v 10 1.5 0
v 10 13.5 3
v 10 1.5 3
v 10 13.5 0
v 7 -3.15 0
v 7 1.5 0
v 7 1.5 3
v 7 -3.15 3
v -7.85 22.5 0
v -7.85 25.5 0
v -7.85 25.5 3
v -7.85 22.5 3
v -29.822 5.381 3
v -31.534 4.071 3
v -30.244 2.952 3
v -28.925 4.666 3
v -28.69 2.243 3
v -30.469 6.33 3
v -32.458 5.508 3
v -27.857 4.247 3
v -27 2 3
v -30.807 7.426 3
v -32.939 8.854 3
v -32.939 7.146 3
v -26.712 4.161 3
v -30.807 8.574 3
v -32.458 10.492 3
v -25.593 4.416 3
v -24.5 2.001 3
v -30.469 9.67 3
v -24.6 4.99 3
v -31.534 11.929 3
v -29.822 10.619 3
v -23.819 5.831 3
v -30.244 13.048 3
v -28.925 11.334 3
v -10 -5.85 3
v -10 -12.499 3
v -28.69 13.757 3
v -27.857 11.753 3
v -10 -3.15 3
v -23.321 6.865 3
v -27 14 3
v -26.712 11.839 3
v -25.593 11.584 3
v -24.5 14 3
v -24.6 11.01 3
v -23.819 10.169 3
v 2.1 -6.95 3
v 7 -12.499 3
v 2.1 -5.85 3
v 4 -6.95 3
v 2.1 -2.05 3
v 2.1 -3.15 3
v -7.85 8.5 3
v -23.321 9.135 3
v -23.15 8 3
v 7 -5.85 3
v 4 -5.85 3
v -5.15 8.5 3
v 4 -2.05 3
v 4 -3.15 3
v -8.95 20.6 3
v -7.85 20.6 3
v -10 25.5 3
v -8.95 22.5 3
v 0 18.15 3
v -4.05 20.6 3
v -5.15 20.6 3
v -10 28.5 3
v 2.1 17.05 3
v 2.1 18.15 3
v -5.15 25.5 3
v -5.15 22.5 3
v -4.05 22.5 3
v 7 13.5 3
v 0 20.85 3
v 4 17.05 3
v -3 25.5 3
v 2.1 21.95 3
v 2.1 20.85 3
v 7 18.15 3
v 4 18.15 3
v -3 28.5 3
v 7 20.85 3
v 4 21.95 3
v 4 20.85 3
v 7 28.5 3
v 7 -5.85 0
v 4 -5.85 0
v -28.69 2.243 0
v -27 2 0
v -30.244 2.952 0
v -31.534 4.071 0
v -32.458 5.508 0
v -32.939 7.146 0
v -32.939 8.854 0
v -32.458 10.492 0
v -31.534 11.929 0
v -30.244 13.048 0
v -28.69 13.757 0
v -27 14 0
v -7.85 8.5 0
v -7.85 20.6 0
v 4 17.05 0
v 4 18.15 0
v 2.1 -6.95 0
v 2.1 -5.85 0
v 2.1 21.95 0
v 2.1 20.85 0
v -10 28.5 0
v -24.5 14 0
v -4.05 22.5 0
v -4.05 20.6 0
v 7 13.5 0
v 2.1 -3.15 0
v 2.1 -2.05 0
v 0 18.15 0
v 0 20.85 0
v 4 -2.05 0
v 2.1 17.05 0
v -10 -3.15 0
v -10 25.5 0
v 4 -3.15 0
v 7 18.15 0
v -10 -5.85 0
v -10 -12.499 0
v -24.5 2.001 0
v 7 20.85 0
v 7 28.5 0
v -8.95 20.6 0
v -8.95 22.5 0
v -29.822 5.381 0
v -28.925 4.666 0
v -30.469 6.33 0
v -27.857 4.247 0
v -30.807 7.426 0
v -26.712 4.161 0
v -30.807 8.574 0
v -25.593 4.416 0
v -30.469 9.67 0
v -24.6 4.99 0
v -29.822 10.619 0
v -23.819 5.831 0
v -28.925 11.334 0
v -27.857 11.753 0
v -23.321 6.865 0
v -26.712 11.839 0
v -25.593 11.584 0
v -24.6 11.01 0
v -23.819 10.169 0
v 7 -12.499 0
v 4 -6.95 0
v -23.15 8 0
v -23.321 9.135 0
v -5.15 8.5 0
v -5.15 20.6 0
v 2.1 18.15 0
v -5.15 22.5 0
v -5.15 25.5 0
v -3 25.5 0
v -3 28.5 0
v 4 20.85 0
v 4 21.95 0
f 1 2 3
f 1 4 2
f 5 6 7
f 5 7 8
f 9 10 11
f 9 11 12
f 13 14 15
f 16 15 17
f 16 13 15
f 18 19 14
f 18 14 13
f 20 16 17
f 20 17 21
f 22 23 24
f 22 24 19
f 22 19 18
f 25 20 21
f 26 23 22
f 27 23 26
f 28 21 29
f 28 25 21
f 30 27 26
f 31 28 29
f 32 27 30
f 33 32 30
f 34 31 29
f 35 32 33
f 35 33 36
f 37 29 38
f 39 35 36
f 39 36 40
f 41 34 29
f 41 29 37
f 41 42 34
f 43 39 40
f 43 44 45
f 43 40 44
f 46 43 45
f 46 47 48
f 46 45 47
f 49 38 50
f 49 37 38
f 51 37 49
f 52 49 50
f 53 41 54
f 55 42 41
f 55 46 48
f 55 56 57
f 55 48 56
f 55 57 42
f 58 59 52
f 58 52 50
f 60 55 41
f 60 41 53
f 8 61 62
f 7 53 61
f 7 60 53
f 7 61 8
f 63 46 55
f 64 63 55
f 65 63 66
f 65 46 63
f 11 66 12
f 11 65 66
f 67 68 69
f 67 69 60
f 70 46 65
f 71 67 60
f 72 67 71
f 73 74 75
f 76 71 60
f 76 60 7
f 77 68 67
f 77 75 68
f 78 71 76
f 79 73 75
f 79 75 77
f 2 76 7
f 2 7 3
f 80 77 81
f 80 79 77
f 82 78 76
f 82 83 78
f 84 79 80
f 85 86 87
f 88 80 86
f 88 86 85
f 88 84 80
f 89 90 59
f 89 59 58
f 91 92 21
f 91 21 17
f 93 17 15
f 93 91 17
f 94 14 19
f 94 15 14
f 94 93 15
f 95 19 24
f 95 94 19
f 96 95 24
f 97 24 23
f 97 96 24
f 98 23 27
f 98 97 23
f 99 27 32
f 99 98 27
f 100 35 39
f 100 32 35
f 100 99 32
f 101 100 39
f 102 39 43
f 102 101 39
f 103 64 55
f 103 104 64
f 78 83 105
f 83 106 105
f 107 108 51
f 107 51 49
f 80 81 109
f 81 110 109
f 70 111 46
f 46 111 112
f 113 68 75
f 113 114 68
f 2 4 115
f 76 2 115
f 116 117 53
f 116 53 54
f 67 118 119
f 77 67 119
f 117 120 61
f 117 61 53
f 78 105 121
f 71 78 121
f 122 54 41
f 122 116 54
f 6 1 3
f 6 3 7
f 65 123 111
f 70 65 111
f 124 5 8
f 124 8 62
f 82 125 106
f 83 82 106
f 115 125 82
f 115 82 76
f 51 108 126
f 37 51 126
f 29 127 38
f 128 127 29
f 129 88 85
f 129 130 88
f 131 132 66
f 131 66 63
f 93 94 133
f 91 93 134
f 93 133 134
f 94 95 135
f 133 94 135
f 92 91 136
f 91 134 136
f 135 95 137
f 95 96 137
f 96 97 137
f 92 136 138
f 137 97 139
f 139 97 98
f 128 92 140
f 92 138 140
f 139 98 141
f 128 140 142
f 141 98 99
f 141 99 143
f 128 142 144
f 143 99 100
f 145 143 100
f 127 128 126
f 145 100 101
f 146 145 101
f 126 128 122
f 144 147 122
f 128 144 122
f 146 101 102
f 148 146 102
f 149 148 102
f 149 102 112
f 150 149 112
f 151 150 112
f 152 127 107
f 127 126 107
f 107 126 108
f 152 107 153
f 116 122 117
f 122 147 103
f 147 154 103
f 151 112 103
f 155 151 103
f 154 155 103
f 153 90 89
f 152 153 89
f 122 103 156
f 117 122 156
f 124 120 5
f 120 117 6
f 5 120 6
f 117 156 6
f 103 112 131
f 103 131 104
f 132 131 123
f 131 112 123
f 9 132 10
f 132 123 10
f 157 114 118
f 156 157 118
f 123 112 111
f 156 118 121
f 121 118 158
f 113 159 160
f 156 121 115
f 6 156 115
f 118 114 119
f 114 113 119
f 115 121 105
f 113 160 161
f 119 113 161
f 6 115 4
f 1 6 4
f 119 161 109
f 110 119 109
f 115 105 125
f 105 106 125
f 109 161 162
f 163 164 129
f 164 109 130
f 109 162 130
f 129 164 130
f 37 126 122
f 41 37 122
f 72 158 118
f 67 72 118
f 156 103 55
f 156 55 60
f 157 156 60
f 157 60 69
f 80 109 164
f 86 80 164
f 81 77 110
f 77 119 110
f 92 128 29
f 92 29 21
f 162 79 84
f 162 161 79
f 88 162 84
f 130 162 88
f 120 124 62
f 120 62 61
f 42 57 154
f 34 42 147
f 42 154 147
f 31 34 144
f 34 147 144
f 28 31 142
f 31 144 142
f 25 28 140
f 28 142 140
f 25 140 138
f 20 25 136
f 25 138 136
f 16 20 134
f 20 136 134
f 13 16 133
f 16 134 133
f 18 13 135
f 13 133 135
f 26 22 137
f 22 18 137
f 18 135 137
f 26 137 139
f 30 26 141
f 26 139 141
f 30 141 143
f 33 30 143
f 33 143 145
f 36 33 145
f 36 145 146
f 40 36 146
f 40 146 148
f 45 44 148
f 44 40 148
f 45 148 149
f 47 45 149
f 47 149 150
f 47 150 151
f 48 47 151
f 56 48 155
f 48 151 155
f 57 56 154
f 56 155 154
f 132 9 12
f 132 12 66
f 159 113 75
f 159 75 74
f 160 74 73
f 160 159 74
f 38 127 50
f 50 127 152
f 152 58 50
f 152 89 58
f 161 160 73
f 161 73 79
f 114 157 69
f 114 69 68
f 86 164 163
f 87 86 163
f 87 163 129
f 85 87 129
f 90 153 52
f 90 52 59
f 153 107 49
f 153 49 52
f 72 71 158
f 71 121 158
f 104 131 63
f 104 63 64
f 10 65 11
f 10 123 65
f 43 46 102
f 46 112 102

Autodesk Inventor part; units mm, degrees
ref_plane "YZ Plane" through (0, 0, 0) normal (1, 0, 0) x (0, 1, 0)
ref_plane "XZ Plane" through (0, 0, 0) normal (0, 1, 0) x (-1, 0, 0)
ref_plane "XY Plane" through (0, 0, 0) normal (0, 0, 1) x (1, 0, 0)
sketch "Эскиз1" plane through (0, 0, 0) normal (0, 0, 1) x (1, 0, 0)
  line L0 (10, -28.5) -> (-10, -28.5)
  line L1 (-10, -28.5) -> (-10, 28.5)
  line L2 (-10, 28.5) -> (10, 28.5)
  line L3 (10, 28.5) -> (10, -28.5)
  line L4 (10, -28.5) -> (-10, 28.5) construction
  line L5 (-10, -28.5) -> (10, 28.5) construction
  line L6 (-10, 28.5) -> (-27, 28.5)
  line L7 (-27, 28.5) -> (-27, -28.5)
  line L8 (-27, -28.5) -> (-10, -28.5)
  line L9 (-10, -28.5) -> (-10, 28.5)
  line L10 (-27, -28.5) -> (-27, 28.5)
  line L11 (10, 28.5) -> (-10, 28.5)
  line L12 (-10, 28.5) -> (-10, 25.5)
  line L13 (-10, 25.5) -> (10, 25.5)
  line L14 (10, 25.5) -> (10, 28.5)
  line L15 (10, 25.5) -> (7, 25.5)
  line L16 (7, 25.5) -> (7, -28.5)
  line L17 (7, -28.5) -> (10, -28.5)
  line L18 (10, -28.5) -> (10, 25.5)
  line L19 (7, 25.5) -> (-3, 25.5)
  line L20 (-3, 25.5) -> (-3, 28.5)
  line L21 (-3, 28.5) -> (7, 28.5)
  line L22 (7, 28.5) -> (7, 25.5)
  line L23 (-10, 25.5) -> (-3, 28.5)
  line L24 (-3, 25.5) -> (-10, 28.5)
  line L25 (-6.5, 27) -> (-6.5, 17)
  line L26 (7, 25.5) -> (10, 25.5)
  line L27 (10, 25.5) -> (10, 13.5)
  line L28 (10, 13.5) -> (7, 13.5)
  line L29 (7, 13.5) -> (7, 25.5)
  line L30 (7, 25.5) -> (10, 13.5)
  line L31 (7, 13.5) -> (10, 25.5)
  line L32 (8.5, 19.5) -> (0, 19.5)
  line L33 (-6.5, 27) -> (-5.15, 27)
  line L34 (-5.15, 27) -> (-5.15, 28.5)
  line L35 (-5.15, 28.5) -> (-6.5, 28.5)
  line L36 (-6.5, 28.5) -> (-6.5, 27)
  line L37 (-5.15, 28.5) -> (-7.85, 28.5)
  line L38 (-7.85, 28.5) -> (-7.85, 8.5)
  line L39 (-7.85, 8.5) -> (-5.15, 8.5)
  line L40 (-5.15, 8.5) -> (-5.15, 28.5)
  line L41 (-5.15, 25.5) -> (-4.05, 25.5)
  line L42 (-4.05, 25.5) -> (-4.05, 22.5)
  line L43 (-4.05, 22.5) -> (-5.15, 22.5)
  line L44 (-5.15, 22.5) -> (-5.15, 25.5)
  line L45 (-4.05, 22.5) -> (-8.95, 22.5)
  line L46 (-8.95, 22.5) -> (-8.95, 20.6)
  line L47 (-8.95, 20.6) -> (-4.05, 20.6)
  line L48 (-4.05, 20.6) -> (-4.05, 22.5)
  line L49 (8.5, 19.5) -> (10, 19.5)
  line L50 (10, 19.5) -> (10, 18.15)
  line L51 (10, 18.15) -> (8.5, 18.15)
  line L52 (8.5, 18.15) -> (8.5, 19.5)
  line L53 (10, 18.15) -> (0, 18.15)
  line L54 (0, 18.15) -> (0, 20.85)
  line L55 (0, 20.85) -> (10, 20.85)
  line L56 (10, 20.85) -> (10, 18.15)
  line L57 (7, 18.15) -> (4, 18.15)
  line L58 (4, 18.15) -> (4, 17.05)
  line L59 (4, 17.05) -> (7, 17.05)
  line L60 (7, 17.05) -> (7, 18.15)
  line L61 (4, 17.05) -> (2.1, 17.05)
  line L62 (2.1, 17.05) -> (2.1, 21.95)
  line L63 (2.1, 21.95) -> (4, 21.95)
  line L64 (4, 21.95) -> (4, 17.05)
  line L65 (7, 13.5) -> (10, 13.5)
  line L66 (10, 13.5) -> (10, 1.5)
  line L67 (10, 1.5) -> (7, 1.5)
  line L68 (7, 1.5) -> (7, 13.5)
  line L69 (7, 1.5) -> (10, 1.5)
  line L70 (10, 1.5) -> (10, -10.5)
  line L71 (10, -10.5) -> (7, -10.5)
  line L72 (7, -10.5) -> (7, 1.5)
  line L73 (8.5, 7.5) -> (7, 7.5)
  line L74 (10, -3.15) -> (0, -3.15)
  line L75 (0, -5.85) -> (10, -5.85)
  line L76 (4, -2.05) -> (2.1, -2.05)
  line L77 (2.1, -2.05) -> (2.1, -6.95)
  line L78 (2.1, -6.95) -> (4, -6.95)
  line L79 (4, -6.95) -> (4, -2.05)
  line L80 (0, -5.85) -> (-6, -5.85)
  line L81 (-6, -3.15) -> (0, -3.15)
  line L82 (0, -3.15) -> (0, -5.85)
  line L83 (10, -5.85) -> (-10, -5.85)
  line L84 (-10, -5.85) -> (-10, -3.15)
  line L85 (-10, -3.15) -> (10, -3.15)
  line L86 (10, -3.15) -> (10, -5.85)
  line L87 (-27, 28.5) -> (-27, 8)
  line L88 (-17.0714, 4) -> (0.879, 4) construction
  line L89 (-10, -12.4989) -> (10, -12.4989)
  circle A0 centre (-27, 8) radius 3.85
  line L90 (-27, 28.5) -> (-33, 28.5)
  line L91 (-33, 28.5) -> (-33, -28.5)
  line L92 (-33, -28.5) -> (-27, -28.5)
  line L93 (-27, -28.5) -> (-27, 28.5)
  circle A1 centre (-27, 8) radius 6
  line L94 (-10, 28.5) -> (-24.5, 14)
  line L95 (-10, 28.5) -> (10.5061, 28.5) construction
  line L96 (-24.5, 14) -> (-27, 14)
  line L97 (-10, -12.4989) -> (-24.5, 2.0011)
  line L98 (-10, -12.4989) -> (10.5061, -12.4989) construction
  line L99 (-24.5, 2.0011) -> (-27, 2)
  point P0 (0, 0)
  point P1 (2.1, 18.15)
  point P2 (2.1, 20.85)
  point P3 (4, 20.85)
  point P4 (7, 20.85)
  point P5 (7, 28.5)
  point P6 (-3, 25.5)
  point P7 (-5.15, 20.6)
  point P8 (-7.85, 20.6)
  point P9 (-7.85, 22.5)
  point P10 (-7.85, 25.5)
  point P11 (7, -5.85)
  point P12 (4, -5.85)
  point P13 (2.1, -5.85)
  point P14 (2.1, -3.15)
  point P15 (4, -3.15)
  point P16 (7, -3.15)
  point P17 (7, 18.15)
  point P18 (2.1, -5.85)
  point P19 (7, -5.85)
  point P20 (4, -5.85)
  point P21 (-10, -28.5)
  point P22 (-27, 12)
  point P23 (-27, 4)
  point P24 (7, -12.4989)
  dimension "d0" = 20
  dimension "d1" = 57
  dimension "d2" = 17
  dimension "d4" = 3
  dimension "d5" = 3
  dimension "d6" = 10
  dimension "d7" = 10
  dimension "d8" = 12
  dimension "d9" = 1.35
  dimension "d10" = 2.7
  dimension "d11" = 20
  dimension "d12" = 1.1
  dimension "d13" = 3
  dimension "d14" = 4.9
  dimension "d15" = 1.9
  dimension "d16" = 1.35
  dimension "d17" = 2.7
  dimension "d18" = 3
  dimension "d19" = 1.1
  dimension "d20" = 1.9
  dimension "d21" = 4.9
  dimension "d22" = 12
  dimension "d23" = 12
  dimension "d27" = 20
  dimension "d28" = 20.5
  dimension "d31" = 7.7
  dimension "d32" = 6
  dimension "d33" = 135
  dimension "d34" = 135
extrude "Выдавливание1" add sketch "Эскиз1" along normal blind 3 contours L7 A0 A1 | L89 L1 L83 L80 L75 L77 L78 L79 L16 | L97 L99 A1 L96 L94 L1 | L1 L13 L38 L45 L46 L47 L39 L40 L48 L42 L16 L55 L64 L63 L62 L54 L53 L61 L59 L74 L79 L76 L77 L81 L85 | L67 L16 L28 L3 | L59 L58 L53 L16 | L13 L42 L43 L40 | L2 L22 L13 L20
properties part number "крепление оси"
